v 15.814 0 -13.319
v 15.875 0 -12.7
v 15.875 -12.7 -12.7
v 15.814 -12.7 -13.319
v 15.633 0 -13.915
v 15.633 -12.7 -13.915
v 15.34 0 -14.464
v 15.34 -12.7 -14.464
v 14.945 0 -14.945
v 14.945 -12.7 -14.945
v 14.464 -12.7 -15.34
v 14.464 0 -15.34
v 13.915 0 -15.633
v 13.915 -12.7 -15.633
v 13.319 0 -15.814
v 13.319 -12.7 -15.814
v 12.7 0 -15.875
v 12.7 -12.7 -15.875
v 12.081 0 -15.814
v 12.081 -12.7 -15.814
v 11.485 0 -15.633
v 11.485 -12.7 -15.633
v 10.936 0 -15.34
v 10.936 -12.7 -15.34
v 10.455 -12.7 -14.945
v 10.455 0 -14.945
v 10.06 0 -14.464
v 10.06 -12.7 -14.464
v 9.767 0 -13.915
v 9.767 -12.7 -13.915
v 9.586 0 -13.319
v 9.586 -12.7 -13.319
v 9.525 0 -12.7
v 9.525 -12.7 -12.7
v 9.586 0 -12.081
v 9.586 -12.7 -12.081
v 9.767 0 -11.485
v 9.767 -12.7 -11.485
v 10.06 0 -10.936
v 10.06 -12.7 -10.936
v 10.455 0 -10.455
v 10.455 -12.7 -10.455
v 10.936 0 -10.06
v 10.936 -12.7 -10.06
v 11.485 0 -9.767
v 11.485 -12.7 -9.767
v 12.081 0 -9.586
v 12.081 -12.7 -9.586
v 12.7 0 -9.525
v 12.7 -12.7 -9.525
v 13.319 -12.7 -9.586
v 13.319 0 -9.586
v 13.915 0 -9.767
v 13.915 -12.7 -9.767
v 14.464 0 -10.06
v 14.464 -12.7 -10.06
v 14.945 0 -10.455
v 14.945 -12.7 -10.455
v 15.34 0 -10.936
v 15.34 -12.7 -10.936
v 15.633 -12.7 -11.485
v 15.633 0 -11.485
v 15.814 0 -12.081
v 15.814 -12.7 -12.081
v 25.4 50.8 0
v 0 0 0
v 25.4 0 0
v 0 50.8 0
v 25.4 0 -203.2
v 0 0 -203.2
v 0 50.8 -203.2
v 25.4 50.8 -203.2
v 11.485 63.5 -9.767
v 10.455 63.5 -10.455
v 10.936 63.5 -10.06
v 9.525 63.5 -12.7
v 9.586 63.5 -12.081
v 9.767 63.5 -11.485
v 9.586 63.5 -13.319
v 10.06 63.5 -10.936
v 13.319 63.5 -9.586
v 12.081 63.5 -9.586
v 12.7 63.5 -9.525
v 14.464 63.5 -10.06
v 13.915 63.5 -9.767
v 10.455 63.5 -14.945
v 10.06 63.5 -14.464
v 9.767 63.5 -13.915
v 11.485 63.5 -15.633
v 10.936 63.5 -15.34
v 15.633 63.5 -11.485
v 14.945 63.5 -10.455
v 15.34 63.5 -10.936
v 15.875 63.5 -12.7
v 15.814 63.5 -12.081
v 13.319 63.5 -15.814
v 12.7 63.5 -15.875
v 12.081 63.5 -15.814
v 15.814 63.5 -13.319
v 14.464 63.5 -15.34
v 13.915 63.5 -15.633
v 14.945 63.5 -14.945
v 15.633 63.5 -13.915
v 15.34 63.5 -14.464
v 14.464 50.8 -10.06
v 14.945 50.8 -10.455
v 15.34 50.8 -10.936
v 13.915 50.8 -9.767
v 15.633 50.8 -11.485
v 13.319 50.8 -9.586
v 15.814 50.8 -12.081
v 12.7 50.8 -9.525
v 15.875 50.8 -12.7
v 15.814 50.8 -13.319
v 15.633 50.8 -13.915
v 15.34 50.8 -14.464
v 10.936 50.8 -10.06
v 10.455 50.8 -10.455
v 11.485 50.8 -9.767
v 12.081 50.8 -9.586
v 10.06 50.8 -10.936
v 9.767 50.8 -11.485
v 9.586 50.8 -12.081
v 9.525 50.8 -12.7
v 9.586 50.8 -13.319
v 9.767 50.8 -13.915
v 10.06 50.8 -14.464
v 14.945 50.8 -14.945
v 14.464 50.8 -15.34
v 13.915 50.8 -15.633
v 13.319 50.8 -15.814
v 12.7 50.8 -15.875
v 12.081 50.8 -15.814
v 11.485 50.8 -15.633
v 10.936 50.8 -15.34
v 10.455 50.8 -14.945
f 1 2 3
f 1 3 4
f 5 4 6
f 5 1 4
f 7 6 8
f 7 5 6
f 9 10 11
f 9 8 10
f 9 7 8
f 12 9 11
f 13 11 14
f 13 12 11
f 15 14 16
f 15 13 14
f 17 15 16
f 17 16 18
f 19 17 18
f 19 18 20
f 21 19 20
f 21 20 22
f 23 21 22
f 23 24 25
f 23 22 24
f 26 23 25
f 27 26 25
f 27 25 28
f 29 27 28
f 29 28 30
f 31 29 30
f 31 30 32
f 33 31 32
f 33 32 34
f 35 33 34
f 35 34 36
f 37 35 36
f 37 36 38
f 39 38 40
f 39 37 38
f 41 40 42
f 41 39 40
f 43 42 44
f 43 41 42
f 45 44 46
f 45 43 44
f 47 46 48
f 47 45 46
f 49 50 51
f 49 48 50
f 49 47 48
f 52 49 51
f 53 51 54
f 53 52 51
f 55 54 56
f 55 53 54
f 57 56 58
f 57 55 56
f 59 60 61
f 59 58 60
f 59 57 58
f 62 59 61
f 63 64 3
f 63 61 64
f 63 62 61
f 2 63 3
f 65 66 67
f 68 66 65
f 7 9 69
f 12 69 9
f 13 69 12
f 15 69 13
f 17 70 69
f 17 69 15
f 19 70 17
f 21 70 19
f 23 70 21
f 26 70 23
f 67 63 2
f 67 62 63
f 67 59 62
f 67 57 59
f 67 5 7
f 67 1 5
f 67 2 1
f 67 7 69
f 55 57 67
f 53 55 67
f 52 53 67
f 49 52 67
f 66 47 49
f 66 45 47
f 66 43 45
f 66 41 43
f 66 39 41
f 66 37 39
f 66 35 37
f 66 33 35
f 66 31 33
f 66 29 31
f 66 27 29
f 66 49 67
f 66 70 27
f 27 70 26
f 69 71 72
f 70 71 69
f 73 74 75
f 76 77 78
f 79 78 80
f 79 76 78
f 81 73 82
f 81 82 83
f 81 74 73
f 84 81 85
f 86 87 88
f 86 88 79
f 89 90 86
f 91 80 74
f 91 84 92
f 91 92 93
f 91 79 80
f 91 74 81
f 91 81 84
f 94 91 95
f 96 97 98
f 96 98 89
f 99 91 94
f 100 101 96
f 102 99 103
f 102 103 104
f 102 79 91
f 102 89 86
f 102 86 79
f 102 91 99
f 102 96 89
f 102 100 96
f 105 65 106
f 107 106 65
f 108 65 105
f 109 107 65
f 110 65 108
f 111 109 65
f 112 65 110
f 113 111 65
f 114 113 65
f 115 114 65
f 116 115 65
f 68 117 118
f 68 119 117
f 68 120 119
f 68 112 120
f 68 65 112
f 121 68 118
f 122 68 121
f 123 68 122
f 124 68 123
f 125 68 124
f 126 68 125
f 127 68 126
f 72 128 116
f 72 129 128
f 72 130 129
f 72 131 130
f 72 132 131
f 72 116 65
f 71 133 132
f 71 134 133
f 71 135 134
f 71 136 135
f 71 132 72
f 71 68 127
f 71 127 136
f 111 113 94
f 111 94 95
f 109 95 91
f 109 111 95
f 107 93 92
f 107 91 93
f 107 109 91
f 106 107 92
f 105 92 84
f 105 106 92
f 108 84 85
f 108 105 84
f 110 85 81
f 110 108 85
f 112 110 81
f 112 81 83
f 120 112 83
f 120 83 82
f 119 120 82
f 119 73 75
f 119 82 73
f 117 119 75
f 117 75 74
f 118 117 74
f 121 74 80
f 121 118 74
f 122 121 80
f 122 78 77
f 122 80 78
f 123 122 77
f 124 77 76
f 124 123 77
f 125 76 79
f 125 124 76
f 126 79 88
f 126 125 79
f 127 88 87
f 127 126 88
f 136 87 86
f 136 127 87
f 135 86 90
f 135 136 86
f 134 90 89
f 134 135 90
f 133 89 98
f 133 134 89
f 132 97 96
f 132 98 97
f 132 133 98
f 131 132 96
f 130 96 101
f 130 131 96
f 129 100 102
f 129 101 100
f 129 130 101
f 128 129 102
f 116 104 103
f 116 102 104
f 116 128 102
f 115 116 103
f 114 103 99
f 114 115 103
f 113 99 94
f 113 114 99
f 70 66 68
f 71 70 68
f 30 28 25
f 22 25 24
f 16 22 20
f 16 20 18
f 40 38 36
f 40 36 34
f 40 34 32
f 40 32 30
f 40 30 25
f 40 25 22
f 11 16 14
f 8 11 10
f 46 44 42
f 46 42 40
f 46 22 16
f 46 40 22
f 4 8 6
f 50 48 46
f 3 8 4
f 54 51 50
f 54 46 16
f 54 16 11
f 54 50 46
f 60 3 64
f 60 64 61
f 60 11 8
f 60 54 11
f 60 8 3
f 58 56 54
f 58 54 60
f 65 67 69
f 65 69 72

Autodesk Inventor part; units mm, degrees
ref_plane "YZ Plane" through (0, 0, 0) normal (1, 0, 0) x (0, 1, 0)
ref_plane "XZ Plane" through (0, 0, 0) normal (0, 1, 0) x (-1, 0, 0)
ref_plane "XY Plane" through (0, 0, 0) normal (0, 0, 1) x (1, 0, 0)
sketch "Sketch1" plane through (0, 0, 0) normal (1, 0, 0) x (0, 1, 0)
  line L0 (0, 0) -> (50.8, 0)
  line L1 (50.8, 0) -> (50.8, -203.2)
  line L2 (50.8, -203.2) -> (0, -203.2)
  line L3 (0, -203.2) -> (0, 0)
  dimension "d0" = 50.8
  dimension "d1" = 203.2
extrude "Extrusion1" add sketch "Sketch1" along normal blind 25.4
sketch "Sketch2" plane through (0, 50.8, 0) normal (0, 1, 0) x (1, 0, 0)
  circle A0 centre (12.7, 12.7) radius 3.175
  line L0 (0, 0) -> (0, 203.2) projected
  line L1 (0, 0) -> (25.4, 0) projected
  line L2 (25.4, 203.2) -> (25.4, 0) projected
  line L3 (0, 203.2) -> (25.4, 203.2) projected
  point P0 (0, 0)
  dimension "d4" = 6.35
  dimension "d5" = 12.7
  dimension "d6" = 12.7
extrude "Extrusion2" add sketch "Sketch2" along normal blind 12.7 contours A0
sketch "Sketch3" plane through (0, 0, -203.2) normal (0, -1, 0) x (1, 0, 0)
  line L0 (0, 0) -> (0, 203.2) projected
  line L1 (0, 0) -> (25.4, 0) projected
  line L2 (25.4, 203.2) -> (25.4, 0) projected
  line L3 (0, 203.2) -> (25.4, 203.2) projected
  circle A0 centre (12.7, 190.5) radius 3.175
  dimension "d9" = 6.35
  dimension "d10" = 12.7
  dimension "d11" = 12.7
extrude "Extrusion3" add sketch "Sketch3" along normal blind 12.7 contours A0
properties part number "StressArm"
